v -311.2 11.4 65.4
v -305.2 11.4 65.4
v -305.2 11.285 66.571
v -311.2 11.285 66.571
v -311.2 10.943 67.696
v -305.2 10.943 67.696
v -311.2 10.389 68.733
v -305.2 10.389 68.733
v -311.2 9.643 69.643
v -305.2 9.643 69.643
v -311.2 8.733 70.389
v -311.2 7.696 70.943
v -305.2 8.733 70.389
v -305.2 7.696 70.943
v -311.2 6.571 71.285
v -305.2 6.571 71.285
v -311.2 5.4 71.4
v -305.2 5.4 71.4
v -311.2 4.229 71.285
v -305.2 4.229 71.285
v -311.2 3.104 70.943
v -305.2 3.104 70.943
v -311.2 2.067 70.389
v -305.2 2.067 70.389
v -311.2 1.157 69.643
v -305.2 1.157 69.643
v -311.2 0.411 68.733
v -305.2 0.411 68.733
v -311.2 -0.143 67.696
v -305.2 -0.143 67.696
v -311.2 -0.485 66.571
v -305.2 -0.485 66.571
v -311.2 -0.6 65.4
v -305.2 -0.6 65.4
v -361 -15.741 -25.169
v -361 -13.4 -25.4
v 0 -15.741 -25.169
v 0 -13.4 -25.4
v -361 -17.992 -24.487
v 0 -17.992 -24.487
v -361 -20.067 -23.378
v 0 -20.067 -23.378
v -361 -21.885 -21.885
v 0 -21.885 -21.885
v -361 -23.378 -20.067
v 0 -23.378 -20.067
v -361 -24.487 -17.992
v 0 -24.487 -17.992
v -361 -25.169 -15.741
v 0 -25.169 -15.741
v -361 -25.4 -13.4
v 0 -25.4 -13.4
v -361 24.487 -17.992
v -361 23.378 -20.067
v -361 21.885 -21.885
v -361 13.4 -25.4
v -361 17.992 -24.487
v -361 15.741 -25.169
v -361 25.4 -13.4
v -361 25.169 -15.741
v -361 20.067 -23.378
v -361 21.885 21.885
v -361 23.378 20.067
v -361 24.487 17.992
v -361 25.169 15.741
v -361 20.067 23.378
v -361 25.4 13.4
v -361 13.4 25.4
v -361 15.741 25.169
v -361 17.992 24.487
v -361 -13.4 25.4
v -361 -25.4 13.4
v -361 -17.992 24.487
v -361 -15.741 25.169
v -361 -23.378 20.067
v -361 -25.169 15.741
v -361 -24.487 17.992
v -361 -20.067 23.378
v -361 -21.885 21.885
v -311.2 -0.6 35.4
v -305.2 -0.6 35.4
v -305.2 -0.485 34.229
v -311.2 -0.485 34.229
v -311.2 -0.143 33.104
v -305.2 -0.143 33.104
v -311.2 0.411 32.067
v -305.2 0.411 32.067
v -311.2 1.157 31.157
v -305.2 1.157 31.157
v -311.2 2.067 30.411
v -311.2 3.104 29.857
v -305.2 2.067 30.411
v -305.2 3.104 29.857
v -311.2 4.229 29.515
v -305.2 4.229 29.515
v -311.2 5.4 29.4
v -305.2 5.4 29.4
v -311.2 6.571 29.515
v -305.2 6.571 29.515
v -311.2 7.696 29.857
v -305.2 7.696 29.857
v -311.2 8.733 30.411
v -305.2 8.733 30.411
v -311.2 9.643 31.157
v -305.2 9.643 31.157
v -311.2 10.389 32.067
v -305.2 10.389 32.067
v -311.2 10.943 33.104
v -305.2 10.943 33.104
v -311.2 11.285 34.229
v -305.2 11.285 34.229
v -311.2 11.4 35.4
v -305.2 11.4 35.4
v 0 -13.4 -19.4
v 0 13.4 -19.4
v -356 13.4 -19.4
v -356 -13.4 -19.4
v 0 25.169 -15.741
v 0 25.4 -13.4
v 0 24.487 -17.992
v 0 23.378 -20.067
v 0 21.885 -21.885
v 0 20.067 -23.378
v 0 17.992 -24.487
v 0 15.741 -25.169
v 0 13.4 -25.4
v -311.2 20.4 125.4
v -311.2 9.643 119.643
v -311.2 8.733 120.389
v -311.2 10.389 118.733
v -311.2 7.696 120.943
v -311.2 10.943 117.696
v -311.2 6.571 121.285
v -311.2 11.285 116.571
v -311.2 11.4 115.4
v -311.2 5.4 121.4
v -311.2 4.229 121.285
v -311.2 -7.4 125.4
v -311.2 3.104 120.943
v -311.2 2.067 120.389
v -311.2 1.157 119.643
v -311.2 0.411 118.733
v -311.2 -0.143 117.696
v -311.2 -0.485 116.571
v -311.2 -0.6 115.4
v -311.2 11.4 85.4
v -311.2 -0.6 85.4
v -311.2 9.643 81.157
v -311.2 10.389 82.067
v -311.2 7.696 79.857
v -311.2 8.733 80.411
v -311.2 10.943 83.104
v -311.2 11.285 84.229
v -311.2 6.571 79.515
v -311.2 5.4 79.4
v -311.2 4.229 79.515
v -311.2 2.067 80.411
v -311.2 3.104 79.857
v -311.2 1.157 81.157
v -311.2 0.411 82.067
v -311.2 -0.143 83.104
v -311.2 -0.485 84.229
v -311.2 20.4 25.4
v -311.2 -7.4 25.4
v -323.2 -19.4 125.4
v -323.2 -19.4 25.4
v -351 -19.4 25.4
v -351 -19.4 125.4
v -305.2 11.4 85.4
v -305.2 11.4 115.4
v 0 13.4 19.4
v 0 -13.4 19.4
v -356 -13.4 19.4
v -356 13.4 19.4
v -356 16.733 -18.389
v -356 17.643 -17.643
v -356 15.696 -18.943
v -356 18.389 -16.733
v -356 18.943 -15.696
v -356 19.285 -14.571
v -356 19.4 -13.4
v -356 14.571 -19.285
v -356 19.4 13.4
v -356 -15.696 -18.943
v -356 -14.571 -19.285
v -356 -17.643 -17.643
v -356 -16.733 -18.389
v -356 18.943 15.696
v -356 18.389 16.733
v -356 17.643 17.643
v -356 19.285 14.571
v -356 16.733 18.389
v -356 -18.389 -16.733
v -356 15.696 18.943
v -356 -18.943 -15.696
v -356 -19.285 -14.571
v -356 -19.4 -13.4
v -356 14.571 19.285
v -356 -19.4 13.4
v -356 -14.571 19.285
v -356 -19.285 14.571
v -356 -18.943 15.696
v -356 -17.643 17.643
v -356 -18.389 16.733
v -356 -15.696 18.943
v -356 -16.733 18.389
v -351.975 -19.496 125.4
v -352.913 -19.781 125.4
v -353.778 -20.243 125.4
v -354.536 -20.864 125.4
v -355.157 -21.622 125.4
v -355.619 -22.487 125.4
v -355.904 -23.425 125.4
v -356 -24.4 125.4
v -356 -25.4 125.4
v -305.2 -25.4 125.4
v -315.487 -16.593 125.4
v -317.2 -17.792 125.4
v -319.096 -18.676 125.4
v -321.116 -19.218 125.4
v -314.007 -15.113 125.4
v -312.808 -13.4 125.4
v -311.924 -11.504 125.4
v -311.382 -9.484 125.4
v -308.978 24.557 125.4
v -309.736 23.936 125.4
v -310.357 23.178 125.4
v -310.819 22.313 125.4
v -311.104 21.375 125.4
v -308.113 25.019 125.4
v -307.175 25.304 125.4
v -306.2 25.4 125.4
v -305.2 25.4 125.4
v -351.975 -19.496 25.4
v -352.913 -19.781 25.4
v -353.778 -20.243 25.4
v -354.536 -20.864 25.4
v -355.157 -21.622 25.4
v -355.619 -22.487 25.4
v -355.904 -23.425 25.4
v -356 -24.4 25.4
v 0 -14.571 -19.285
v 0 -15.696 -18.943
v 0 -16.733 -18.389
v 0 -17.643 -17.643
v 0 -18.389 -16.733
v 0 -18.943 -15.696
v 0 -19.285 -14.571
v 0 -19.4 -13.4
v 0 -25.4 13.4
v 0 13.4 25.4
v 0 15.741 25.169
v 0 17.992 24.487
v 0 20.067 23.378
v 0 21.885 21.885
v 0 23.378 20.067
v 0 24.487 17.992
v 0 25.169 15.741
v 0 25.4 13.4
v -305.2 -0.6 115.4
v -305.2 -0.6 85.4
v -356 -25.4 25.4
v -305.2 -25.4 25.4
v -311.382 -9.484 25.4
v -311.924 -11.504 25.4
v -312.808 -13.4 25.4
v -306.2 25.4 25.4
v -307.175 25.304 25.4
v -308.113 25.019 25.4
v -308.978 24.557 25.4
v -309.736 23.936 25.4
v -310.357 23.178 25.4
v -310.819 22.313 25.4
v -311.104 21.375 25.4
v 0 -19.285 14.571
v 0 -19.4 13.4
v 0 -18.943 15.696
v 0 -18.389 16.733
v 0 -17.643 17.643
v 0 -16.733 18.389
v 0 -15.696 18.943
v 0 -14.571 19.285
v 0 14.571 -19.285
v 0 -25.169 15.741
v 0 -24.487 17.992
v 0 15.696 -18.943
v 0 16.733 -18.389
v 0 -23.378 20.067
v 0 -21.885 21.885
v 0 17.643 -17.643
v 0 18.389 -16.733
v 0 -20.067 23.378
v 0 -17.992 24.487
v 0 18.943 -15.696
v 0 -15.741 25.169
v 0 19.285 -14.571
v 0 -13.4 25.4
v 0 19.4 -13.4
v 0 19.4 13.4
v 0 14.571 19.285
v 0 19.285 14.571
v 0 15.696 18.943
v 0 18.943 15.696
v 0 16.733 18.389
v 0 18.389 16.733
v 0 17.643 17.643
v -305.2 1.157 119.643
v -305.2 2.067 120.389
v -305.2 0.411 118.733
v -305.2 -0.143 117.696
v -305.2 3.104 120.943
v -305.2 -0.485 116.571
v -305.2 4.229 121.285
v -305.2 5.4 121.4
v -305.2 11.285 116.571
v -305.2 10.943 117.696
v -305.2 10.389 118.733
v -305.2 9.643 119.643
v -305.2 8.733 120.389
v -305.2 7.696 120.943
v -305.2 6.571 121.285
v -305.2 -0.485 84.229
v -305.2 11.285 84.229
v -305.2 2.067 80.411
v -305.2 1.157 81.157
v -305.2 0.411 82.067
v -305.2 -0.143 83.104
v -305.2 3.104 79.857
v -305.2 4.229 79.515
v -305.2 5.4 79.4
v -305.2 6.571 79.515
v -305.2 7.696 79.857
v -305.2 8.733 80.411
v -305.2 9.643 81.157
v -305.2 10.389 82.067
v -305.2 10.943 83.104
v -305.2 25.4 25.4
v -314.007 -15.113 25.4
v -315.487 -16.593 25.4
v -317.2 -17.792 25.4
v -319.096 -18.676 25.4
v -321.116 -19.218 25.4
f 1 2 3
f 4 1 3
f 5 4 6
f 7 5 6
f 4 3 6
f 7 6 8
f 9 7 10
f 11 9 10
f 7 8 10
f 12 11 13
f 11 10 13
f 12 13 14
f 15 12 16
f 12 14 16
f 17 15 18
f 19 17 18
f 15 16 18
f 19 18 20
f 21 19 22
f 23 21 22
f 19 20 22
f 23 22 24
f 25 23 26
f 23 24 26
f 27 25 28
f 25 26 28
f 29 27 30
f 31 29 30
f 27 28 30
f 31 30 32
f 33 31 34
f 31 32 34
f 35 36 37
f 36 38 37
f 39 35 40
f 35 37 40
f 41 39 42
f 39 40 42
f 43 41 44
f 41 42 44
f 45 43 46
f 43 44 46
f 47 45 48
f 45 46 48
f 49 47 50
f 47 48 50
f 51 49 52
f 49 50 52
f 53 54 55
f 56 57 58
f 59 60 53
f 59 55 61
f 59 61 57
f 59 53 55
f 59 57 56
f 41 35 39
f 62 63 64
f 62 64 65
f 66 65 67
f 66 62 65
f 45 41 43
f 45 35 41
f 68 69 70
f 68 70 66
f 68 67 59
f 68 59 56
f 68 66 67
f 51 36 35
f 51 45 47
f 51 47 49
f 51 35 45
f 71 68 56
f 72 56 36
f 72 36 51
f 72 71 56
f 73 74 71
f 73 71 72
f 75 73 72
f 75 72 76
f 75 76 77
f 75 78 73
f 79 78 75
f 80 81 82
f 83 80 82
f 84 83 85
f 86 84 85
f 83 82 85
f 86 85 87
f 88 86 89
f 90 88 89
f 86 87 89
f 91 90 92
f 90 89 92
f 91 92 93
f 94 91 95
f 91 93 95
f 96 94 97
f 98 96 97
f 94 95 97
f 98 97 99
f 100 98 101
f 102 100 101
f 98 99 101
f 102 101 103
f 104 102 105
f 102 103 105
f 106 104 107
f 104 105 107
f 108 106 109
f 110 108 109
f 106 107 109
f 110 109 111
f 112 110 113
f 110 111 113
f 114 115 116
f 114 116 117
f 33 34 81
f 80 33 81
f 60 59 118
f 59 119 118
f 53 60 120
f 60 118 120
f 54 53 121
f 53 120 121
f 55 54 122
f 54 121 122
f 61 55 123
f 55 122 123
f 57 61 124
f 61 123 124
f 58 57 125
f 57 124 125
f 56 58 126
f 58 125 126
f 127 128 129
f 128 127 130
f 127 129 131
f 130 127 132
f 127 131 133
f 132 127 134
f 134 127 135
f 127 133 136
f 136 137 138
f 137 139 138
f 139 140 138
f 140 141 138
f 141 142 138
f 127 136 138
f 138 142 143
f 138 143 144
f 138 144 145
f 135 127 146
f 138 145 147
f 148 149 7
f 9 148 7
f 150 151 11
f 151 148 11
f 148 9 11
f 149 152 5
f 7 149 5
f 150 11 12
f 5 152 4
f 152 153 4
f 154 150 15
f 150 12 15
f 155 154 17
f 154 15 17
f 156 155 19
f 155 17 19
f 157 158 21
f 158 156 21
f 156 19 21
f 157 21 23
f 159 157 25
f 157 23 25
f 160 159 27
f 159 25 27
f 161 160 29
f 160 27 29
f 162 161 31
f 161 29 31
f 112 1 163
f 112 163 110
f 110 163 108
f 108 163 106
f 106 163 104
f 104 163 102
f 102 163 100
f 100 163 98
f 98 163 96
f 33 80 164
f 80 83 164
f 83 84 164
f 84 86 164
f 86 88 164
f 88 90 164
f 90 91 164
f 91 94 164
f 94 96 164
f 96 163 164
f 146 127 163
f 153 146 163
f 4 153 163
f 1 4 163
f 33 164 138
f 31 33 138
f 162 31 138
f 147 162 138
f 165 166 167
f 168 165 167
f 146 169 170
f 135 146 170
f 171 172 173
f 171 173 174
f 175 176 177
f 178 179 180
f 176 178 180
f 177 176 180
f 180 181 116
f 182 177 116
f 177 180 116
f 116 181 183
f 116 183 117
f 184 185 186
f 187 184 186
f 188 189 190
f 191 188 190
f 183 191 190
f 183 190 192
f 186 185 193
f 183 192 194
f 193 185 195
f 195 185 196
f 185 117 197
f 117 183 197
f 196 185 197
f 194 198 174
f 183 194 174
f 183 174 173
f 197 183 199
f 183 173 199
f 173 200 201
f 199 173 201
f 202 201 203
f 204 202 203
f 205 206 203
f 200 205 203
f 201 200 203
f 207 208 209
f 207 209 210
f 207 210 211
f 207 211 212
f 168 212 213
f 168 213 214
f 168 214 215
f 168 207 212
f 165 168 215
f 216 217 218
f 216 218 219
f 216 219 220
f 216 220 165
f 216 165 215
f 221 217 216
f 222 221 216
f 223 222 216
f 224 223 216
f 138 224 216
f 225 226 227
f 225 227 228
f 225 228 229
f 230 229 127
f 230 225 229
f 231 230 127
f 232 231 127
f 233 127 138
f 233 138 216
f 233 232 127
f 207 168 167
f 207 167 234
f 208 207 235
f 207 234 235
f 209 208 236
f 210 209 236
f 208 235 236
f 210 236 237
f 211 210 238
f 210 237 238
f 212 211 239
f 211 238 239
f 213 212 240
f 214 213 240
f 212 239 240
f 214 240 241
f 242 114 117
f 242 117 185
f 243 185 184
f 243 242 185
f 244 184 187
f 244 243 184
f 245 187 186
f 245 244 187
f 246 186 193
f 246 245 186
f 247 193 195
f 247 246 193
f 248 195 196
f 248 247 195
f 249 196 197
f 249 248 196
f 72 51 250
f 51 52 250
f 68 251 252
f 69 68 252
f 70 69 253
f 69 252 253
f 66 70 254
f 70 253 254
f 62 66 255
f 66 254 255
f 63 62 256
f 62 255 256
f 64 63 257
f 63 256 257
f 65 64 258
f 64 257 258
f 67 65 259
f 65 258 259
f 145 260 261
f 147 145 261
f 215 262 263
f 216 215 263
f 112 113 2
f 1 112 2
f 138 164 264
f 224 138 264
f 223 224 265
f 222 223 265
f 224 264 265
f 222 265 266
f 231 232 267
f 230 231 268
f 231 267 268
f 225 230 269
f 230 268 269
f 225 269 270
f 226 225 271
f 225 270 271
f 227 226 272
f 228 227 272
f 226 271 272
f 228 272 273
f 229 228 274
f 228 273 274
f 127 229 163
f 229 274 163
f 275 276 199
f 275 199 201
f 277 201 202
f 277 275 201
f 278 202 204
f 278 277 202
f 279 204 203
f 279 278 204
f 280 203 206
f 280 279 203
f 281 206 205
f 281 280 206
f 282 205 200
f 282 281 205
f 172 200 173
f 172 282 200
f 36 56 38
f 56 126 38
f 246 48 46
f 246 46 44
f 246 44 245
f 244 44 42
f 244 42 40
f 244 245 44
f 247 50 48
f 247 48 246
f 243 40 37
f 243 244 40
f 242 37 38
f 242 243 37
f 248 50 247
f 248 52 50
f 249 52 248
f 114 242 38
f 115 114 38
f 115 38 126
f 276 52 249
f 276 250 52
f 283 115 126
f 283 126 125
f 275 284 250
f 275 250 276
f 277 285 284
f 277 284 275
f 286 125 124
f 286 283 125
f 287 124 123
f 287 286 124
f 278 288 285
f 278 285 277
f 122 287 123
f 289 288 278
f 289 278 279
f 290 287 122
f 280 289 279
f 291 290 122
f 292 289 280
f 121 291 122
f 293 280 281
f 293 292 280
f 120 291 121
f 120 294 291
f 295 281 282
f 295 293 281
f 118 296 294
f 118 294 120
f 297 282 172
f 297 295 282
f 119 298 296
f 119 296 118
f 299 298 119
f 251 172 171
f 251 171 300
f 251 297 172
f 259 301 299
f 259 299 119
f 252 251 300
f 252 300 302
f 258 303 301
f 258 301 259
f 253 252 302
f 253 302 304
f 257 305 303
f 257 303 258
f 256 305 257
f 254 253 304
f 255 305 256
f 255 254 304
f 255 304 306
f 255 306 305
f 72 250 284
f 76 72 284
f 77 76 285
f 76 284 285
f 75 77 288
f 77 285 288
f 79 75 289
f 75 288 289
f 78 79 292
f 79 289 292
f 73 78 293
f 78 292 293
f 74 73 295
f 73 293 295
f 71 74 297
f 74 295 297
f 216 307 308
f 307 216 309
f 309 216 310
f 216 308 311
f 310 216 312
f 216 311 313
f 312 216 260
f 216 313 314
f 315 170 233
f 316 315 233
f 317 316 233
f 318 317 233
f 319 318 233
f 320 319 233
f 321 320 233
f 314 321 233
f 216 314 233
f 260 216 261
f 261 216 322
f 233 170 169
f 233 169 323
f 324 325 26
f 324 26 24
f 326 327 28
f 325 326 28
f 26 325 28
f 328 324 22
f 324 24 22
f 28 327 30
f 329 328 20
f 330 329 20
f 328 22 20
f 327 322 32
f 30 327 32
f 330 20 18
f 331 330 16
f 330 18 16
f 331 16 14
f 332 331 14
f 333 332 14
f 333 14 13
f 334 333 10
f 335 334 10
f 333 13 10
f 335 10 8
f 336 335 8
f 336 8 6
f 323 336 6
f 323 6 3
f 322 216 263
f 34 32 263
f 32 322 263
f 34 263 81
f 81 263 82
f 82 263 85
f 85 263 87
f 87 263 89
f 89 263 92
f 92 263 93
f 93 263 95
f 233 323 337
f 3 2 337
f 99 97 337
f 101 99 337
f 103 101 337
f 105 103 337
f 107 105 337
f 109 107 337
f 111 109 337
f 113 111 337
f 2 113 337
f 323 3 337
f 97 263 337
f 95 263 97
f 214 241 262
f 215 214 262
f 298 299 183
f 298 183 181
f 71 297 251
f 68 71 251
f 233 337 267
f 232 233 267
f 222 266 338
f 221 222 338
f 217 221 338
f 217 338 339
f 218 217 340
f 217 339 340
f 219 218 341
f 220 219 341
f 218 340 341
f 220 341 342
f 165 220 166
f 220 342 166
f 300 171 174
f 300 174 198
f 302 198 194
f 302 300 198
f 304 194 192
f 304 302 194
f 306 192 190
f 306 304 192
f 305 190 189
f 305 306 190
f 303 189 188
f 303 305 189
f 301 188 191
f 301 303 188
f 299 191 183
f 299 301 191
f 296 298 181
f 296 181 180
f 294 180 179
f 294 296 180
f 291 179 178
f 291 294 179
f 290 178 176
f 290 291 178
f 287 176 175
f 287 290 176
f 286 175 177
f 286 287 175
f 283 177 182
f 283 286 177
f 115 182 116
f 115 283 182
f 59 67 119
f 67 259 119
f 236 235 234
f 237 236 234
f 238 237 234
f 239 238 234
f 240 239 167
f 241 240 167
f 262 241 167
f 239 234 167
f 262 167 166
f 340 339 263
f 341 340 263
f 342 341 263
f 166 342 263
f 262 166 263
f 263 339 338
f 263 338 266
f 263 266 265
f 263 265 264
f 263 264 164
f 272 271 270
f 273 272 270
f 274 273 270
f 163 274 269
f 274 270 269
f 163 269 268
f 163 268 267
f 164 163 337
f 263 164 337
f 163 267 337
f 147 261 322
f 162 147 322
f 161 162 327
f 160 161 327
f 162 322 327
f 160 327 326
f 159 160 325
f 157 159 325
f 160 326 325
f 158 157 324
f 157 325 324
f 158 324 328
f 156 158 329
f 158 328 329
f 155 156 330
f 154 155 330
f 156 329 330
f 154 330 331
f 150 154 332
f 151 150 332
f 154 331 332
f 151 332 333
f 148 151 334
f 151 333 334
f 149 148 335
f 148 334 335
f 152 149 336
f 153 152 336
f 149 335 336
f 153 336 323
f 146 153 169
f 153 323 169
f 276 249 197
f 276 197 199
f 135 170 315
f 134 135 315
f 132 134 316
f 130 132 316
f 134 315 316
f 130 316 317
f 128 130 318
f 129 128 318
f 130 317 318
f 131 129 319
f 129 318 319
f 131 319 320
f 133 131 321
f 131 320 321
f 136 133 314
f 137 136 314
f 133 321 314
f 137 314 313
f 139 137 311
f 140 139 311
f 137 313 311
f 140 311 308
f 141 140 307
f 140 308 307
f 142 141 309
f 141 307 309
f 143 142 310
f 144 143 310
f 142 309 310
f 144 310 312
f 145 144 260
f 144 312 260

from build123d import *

# Parameters (mm, degrees)
F1_DEPTH = 356
F3_DEPTH = 100
F5_DEPTH = 50.801
F7_DEPTH = 5


with BuildPart() as f1:
    # F0 (on Right) → F1 (new body)
    with BuildSketch(Plane.YZ):
        with BuildLine():
            Line((13.4, 25.4), (-13.4, 25.4))
            ThreePointArc((-13.4, 25.4), (-21.885281, 21.885281), (-25.4, 13.4))
            Line((-25.4, 13.4), (-25.4, -13.4))
            ThreePointArc((-25.4, -13.4), (-21.885281, -21.885281), (-13.4, -25.4))
            Line((-13.4, -25.4), (13.4, -25.4))
            ThreePointArc((13.4, -25.4), (21.885281, -21.885281), (25.4, -13.4))
            Line((25.4, -13.4), (25.4, 13.4))
            ThreePointArc((25.4, 13.4), (21.885281, 21.885281), (13.4, 25.4))
        make_face()
        with BuildLine():
            ThreePointArc((-19.4, 13.4), (-17.642641, 17.642641), (-13.4, 19.4))
            Line((-13.4, 19.4), (13.4, 19.4))
            ThreePointArc((13.4, 19.4), (17.642641, 17.642641), (19.4, 13.4))
            Line((19.4, 13.4), (19.4, -13.4))
            ThreePointArc((19.4, -13.4), (17.642641, -17.642641), (13.4, -19.4))
            Line((13.4, -19.4), (-13.4, -19.4))
            ThreePointArc((-13.4, -19.4), (-17.642641, -17.642641), (-19.4, -13.4))
            Line((-19.4, -13.4), (-19.4, 13.4))
        make_face(mode=Mode.SUBTRACT)
    extrude(amount=-F1_DEPTH)

    # F6 (on face) → F7 (join)
    with BuildSketch(Plane(origin=(-356, 0, 0), x_dir=(0, -1, 0), z_dir=(-1, 0, 0))):
        with BuildLine():
            ThreePointArc((-13.4, 25.4), (-21.885281, 21.885281), (-25.4, 13.4))
            Line((-25.4, 13.4), (-25.4, -13.4))
            ThreePointArc((-25.4, -13.4), (-21.885281, -21.885281), (-13.4, -25.4))
            Line((-13.4, -25.4), (13.4, -25.4))
            ThreePointArc((13.4, -25.4), (21.885281, -21.885281), (25.4, -13.4))
            Line((25.4, -13.4), (25.4, 13.4))
            ThreePointArc((25.4, 13.4), (21.885281, 21.885281), (13.4, 25.4))
            Line((13.4, 25.4), (-13.4, 25.4))
        make_face()
    extrude(amount=F7_DEPTH)


with BuildPart() as f3:
    # F2 (on face) → F3 (new body)
    with BuildSketch(Plane.XY.offset(25.4)):
        with BuildLine():
            Line((-356, -25.4), (-305.2, -25.4))
            Line((-305.2, -25.4), (-305.2, -13.4))
            Line((-305.2, -13.4), (-312.807695, -13.4))
            ThreePointArc((-312.807695, -13.4), (-317.2, -17.792305), (-323.2, -19.4))
            Line((-323.2, -19.4), (-351, -19.4))
            ThreePointArc((-351, -19.4), (-354.535534, -20.864466), (-356, -24.4))
            Line((-356, -24.4), (-356, -25.4))
        make_face()
        with BuildLine():
            Line((-312.807695, -13.4), (-305.2, -13.4))
            Line((-305.2, -13.4), (-305.2, 13.4))
            Line((-305.2, 13.4), (-311.2, 13.4))
            Line((-311.2, 13.4), (-311.2, -7.4))
            ThreePointArc((-311.2, -7.4), (-311.60889, -10.505829), (-312.807695, -13.4))
        make_face()
        with BuildLine():
            Line((-311.2, 13.4), (-305.2, 13.4))
            Line((-305.2, 13.4), (-305.2, 25.4))
            Line((-305.2, 25.4), (-306.2, 25.4))
            ThreePointArc((-306.2, 25.4), (-309.735534, 23.935534), (-311.2, 20.4))
            Line((-311.2, 20.4), (-311.2, 13.4))
        make_face()
    extrude(amount=F3_DEPTH)

    # F4 (on face) → F5 (cut, through all)
    with BuildSketch(Plane.YZ.offset(-305.2)):
        with BuildLine():
            ThreePointArc((11.4, 115.4), (5.4, 121.4), (-0.6, 115.4))
            Line((-0.6, 115.4), (-0.6, 85.4))
            ThreePointArc((-0.6, 85.4), (5.4, 79.4), (11.4, 85.4))
            Line((11.4, 85.4), (11.4, 115.4))
        make_face()
        with BuildLine():
            Line((-0.6, 65.4), (-0.6, 35.4))
            ThreePointArc((-0.6, 35.4), (5.4, 29.4), (11.4, 35.4))
            Line((11.4, 35.4), (11.4, 65.4))
            ThreePointArc((11.4, 65.4), (5.4, 71.4), (-0.6, 65.4))
        make_face()
    extrude(amount=-F5_DEPTH, mode=Mode.SUBTRACT)


solid = Compound([f1.part, f3.part])
